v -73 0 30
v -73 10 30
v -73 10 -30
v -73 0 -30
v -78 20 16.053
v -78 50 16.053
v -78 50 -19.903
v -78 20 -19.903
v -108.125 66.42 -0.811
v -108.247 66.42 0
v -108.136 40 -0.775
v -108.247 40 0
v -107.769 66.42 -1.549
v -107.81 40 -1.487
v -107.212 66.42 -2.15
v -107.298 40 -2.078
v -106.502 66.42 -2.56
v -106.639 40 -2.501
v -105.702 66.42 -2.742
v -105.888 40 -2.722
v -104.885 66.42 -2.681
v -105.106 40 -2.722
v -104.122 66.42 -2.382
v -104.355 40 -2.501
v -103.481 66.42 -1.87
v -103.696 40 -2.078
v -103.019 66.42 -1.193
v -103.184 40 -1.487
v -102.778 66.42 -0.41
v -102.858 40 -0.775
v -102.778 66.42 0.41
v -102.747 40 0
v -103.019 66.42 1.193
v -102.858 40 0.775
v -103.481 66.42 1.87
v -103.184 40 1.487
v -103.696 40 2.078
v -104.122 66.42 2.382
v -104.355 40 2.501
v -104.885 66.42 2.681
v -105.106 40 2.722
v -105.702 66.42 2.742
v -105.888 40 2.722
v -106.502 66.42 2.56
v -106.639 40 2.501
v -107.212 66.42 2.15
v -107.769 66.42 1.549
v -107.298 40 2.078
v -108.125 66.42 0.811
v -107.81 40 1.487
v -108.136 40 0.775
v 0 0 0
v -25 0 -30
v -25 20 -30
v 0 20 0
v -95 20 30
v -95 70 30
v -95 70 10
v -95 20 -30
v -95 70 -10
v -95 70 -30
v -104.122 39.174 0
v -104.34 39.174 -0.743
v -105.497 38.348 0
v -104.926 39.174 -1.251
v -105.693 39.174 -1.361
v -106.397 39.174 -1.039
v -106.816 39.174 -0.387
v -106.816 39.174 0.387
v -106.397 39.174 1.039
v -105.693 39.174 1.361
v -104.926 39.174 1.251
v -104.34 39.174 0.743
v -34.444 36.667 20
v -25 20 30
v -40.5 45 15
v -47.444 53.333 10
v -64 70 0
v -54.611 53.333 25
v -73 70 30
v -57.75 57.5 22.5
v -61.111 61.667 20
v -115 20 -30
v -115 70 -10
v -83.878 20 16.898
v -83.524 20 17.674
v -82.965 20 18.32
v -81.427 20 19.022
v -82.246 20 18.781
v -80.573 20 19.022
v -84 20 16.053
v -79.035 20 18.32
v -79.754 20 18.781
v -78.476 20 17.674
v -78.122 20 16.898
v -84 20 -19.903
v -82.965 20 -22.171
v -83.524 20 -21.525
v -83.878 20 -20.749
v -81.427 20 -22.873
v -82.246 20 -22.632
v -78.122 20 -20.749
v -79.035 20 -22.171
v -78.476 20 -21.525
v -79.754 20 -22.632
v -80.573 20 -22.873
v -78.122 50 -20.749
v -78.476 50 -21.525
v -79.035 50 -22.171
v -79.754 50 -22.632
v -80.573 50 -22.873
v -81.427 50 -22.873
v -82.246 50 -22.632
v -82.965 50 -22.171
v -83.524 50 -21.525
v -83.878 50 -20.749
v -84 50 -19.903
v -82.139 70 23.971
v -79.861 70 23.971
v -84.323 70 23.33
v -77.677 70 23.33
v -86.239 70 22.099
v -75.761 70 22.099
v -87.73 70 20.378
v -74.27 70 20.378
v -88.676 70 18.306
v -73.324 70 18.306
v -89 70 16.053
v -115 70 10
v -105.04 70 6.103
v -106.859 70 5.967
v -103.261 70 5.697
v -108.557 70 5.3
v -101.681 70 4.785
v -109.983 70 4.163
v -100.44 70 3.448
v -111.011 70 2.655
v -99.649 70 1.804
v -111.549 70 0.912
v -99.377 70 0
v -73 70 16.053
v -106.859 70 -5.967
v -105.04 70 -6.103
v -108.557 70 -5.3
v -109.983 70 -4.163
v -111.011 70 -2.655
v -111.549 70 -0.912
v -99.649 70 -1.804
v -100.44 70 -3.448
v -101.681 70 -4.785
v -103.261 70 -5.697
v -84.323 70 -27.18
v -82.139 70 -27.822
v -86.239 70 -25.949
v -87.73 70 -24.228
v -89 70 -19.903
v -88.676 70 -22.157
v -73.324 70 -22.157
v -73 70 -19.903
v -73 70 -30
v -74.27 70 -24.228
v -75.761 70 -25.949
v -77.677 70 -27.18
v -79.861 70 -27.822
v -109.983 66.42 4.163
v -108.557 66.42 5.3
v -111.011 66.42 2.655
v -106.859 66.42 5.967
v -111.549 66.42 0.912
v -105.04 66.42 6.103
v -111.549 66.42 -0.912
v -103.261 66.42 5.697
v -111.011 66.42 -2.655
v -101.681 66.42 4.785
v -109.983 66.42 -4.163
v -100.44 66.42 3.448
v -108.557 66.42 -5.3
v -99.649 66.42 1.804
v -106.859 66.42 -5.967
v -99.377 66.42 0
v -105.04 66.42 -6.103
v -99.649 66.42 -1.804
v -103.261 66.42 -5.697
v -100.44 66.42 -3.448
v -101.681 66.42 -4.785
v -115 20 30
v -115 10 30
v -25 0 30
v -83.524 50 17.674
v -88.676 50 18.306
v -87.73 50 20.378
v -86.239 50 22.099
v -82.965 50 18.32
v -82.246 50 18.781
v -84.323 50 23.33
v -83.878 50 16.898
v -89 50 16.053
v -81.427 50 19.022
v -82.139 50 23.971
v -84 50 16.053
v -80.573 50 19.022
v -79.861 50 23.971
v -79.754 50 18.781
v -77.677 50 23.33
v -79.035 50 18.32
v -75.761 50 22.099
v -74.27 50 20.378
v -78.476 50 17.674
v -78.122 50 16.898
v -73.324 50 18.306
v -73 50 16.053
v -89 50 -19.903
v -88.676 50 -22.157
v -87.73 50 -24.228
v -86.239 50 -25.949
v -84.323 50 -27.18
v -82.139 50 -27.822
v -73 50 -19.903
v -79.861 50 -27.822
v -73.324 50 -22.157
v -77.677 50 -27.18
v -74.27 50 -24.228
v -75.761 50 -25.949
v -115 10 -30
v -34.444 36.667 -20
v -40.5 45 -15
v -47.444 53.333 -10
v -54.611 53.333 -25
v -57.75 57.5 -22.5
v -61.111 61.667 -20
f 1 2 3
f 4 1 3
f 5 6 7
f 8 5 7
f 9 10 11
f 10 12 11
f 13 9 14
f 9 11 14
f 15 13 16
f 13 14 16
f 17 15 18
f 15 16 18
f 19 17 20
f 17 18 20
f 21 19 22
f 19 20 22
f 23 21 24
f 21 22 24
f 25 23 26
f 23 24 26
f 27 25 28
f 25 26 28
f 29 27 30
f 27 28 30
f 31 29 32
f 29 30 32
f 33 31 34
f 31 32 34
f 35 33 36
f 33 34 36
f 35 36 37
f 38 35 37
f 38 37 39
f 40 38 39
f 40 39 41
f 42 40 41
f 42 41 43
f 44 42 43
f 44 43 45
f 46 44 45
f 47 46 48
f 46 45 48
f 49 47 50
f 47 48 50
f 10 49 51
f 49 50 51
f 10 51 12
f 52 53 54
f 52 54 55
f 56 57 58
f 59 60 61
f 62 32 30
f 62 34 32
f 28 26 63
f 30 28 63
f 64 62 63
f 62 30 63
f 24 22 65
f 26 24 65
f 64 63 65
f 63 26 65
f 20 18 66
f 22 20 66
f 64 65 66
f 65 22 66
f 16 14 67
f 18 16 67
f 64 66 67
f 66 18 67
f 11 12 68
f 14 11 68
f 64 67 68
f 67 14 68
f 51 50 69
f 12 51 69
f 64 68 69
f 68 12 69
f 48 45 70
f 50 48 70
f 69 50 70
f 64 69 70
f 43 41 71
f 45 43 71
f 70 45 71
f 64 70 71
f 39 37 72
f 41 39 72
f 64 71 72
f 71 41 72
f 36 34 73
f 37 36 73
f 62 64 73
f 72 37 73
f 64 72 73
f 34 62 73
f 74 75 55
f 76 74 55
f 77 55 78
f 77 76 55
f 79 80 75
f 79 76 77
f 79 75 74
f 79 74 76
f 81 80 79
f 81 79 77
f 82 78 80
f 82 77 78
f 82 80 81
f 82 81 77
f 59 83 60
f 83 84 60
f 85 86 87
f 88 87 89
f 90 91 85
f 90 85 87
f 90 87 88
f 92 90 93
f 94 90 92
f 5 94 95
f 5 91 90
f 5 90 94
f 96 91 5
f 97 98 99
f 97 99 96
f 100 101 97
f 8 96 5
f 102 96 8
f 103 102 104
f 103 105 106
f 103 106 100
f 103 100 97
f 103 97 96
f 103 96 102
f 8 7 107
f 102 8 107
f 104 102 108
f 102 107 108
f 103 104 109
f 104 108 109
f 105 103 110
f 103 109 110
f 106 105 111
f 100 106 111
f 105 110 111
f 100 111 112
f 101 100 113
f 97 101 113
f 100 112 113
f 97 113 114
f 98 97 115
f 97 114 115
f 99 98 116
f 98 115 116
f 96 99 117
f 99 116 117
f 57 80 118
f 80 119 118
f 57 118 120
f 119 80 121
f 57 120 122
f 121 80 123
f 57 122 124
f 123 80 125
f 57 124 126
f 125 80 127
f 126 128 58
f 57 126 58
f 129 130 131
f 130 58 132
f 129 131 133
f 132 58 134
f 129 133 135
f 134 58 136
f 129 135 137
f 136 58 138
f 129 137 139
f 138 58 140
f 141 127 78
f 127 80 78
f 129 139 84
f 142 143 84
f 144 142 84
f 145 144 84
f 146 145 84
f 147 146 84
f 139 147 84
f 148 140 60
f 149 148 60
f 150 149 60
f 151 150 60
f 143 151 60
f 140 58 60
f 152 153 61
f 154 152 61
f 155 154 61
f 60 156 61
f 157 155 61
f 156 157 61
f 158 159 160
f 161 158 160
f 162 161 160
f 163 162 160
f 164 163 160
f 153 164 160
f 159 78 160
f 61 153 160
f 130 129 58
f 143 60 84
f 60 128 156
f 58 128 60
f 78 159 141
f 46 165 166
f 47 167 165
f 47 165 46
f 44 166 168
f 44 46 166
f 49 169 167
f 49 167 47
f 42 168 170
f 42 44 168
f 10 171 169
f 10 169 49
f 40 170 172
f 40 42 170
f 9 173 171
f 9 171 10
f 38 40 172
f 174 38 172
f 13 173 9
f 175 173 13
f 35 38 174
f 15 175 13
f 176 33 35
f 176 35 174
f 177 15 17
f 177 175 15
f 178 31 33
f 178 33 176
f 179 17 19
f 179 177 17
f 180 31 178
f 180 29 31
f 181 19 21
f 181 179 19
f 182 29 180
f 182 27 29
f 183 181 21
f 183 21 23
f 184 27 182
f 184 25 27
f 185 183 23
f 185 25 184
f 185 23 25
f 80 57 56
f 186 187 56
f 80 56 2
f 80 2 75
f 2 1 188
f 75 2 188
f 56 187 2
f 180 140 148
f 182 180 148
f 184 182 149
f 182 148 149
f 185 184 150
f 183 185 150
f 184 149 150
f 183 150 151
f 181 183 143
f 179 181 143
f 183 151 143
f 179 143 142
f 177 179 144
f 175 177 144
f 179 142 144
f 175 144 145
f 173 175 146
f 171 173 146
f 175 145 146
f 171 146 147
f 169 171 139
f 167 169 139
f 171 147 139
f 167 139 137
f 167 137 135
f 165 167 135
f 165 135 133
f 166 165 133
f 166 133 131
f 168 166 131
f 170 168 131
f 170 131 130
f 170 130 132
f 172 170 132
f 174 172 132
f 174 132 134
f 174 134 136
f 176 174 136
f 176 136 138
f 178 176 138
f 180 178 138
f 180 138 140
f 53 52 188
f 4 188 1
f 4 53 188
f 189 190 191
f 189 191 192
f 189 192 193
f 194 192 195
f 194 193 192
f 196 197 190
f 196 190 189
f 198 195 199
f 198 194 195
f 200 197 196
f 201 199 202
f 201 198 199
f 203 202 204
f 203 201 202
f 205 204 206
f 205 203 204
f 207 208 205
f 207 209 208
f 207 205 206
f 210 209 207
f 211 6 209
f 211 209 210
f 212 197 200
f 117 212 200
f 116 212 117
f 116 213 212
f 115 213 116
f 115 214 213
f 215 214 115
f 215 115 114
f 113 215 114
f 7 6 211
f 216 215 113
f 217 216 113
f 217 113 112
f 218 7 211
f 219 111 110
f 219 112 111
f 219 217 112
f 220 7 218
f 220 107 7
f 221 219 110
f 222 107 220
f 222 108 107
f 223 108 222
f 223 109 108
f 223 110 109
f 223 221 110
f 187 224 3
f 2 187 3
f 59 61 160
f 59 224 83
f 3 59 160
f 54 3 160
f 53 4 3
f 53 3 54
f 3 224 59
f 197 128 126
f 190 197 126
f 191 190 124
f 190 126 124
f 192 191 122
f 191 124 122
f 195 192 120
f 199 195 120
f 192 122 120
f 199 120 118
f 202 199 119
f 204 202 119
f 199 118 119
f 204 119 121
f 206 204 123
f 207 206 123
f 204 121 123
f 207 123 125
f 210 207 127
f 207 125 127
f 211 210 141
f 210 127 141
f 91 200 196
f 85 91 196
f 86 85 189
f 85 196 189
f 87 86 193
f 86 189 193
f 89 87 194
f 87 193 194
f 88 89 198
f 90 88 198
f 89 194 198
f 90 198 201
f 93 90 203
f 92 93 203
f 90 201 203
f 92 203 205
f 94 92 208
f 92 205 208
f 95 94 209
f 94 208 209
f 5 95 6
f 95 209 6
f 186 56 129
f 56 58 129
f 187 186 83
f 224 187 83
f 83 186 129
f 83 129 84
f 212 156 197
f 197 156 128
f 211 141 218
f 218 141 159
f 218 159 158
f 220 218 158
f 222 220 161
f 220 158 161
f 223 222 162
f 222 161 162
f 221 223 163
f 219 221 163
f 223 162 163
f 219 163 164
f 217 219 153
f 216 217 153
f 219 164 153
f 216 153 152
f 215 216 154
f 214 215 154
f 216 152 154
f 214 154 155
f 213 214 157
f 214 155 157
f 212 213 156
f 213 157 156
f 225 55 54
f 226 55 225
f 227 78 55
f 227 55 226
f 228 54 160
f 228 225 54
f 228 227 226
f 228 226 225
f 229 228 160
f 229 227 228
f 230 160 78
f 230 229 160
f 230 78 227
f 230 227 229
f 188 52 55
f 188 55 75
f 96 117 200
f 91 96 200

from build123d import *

# Parameters (mm, degrees)
BOSS_EXTRUDE2_REACH                                  = 123.758
SKETCH4_119_W                                        = 22
SKETCH4_119_H                                        = 60
BOSS_EXTRUDE3_DEPTH                                  = 50
CUT_EXTRUDE1_DEPTH                                   = 20
CUT_EXTRUDE2_DEPTH                                   = 50
CUT_EXTRUDE3_START                                   = -10
SKETCH4_121_W                                        = 20
SKETCH4_121_H                                        = 60
SKETCH4_121_W_2                                      = 22
CUT_EXTRUDE3_DEPTH                                   = 10
CBORE_FOR_5_16_BINDING_HEAD_MACHINE_SCRE_D           = 5.499999922
CBORE_FOR_5_16_BINDING_HEAD_MACHINE_SCRE_DEPTH       = 30
CBORE_FOR_5_16_BINDING_HEAD_MACHINE_SCRE_CBORE_D     = 12.239999904
CBORE_FOR_5_16_BINDING_HEAD_MACHINE_SCRE_CBORE_DEPTH = 3.579999952
CBORE_FOR_5_16_BINDING_HEAD_MACHINE_SCRE_TIP         = 1.652366679


with BuildPart() as part:
    # Loft3: read off the stored shape, not the designer's step
    # Loft3: loft between two sections, ruled curve by curve
    loft3_from = [
        Edge.make_bspline([(-25, 20, 30), (0, 20, 0)], [0, 0, 1, 1], 1),
        Edge.make_bspline([(0, 20, 0), (-25, 20, -30)], [0, 0, 1, 1], 1),
        Edge.make_line((-73, 20, 30), (-25, 20, 30)),
        Edge.make_line((-25, 20, -30), (-73, 20, -30)),
        Edge.make_line((-73, 20, -30), (-73, 20, 30)),
    ]
    loft3_to = [
        Edge.make_bspline([(-73, 70, 30), (-64, 70, 0)], [0, 0, 1, 1], 1),
        Edge.make_bspline([(-64, 70, 0), (-73, 70, -30)], [0, 0, 1, 1], 1),
        Edge.make_line((-95, 70, 30), (-73, 70, 30)),
        Edge.make_line((-73, 70, -30), (-95, 70, -30)),
        Edge.make_line((-95, 70, -30), (-95, 70, 30)),
    ]
    loft3 = Solid(Shell([*[Face.make_surface_from_curves(loft3_from[k], loft3_to[k]) for k in range(5)], Face(Wire(loft3_from)), Face(Wire(loft3_to))]))
    add(loft3)

    # Boss-Extrude2: up to this face of the body (flat: up to its plane)
    boss_extrude2_end = Plane(part.part.faces().sort_by_distance((-42.319559229, 20, 0))[0])
    # Sketch1 → Boss-Extrude2 (add, up to the picked face)
    with BuildSketch(Plane(origin=(0, 0, 0), x_dir=(1, 0, 0), z_dir=(0, 1, 0)), mode=Mode.PRIVATE) as boss_extrude2_sk1:
        Polygon((-115, -30), (-115, 30), (-25, 30), (0, 0), (-25, -30), align=None)
    boss_extrude2_tool1 = split(extrude(boss_extrude2_sk1.sketch, amount=BOSS_EXTRUDE2_REACH, mode=Mode.PRIVATE), bisect_by=boss_extrude2_end, keep=Keep.BOTH, mode=Mode.PRIVATE)
    add(boss_extrude2_tool1.solids().sort_by(Axis((-63.495935, 0, 0), (0, 1, 0)))[0])

    # Sketch4 → Loft7 section 0
    with BuildSketch(Plane(origin=(0, 20, 0), x_dir=(1, 0, 0), z_dir=(0, 1, 0))):
        with BuildLine():
            Line((-73, -30), (-73, 30))
            Line((-73, 30), (-95, 30))
            Line((-95, 30), (-95, -30))
            Line((-95, -30), (-73, -30))
        make_face()
    # Sketch2<11> → Loft7 section 1
    with BuildSketch(Plane(origin=(0, 70, 0), x_dir=(1, 0, 0), z_dir=(0, 1, 0))):
        with BuildLine():
            Line((-115, 10), (-115, -10))
            Line((-115, -10), (-95, -10))
            Line((-95, -10), (-95, 10))
            Line((-95, 10), (-115, 10))
        make_face()
    loft()

    # Sketch2<14> → section 1 of loft9
    with BuildSketch(Plane(origin=(0, 70, 0), x_dir=(1, 0, 0), z_dir=(0, 1, 0)), mode=Mode.PRIVATE) as loft9_s1:
        with BuildLine():
            Line((-115, 10), (-115, -10))
            Line((-115, -10), (-95, -10))
            Line((-95, -10), (-95, 10))
            Line((-95, 10), (-115, 10))
        make_face()
    # loft from a face of the part (loft9)
    loft([part.faces().sort_by_distance((-105, 20, 0))[0], loft9_s1.sketch])

    # Sketch4<119> → Boss-Extrude3 (add)
    with BuildSketch(Plane(origin=(0, 20, 0), x_dir=(1, 0, 0), z_dir=(0, 1, 0))):
        with Locations((-84, 0)):
            Rectangle(SKETCH4_119_W, SKETCH4_119_H)
    extrude(amount=BOSS_EXTRUDE3_DEPTH)

    # Sketch2<8> → Cut-Extrude1 (cut)
    with BuildSketch(Plane(origin=(0, 70, 0), x_dir=(1, 0, 0), z_dir=(0, 1, 0))):
        with BuildLine():
            Line((-89, 19.903363007), (-89, -16.052534228))
            ThreePointArc((-89, -16.052534228), (-81, -24.052534228), (-73, -16.052534228))
            Line((-73, -16.052534228), (-73, 19.903363007))
            ThreePointArc((-73, 19.903363007), (-81, 27.903363007), (-89, 19.903363007))
        make_face()
        with BuildLine():
            ThreePointArc((-78, 19.903363007), (-81, 22.903363007), (-84, 19.903363007))
            Line((-84, 19.903363007), (-84, -16.052534228))
            ThreePointArc((-84, -16.052534228), (-81, -19.052534228), (-78, -16.052534228))
            Line((-78, -16.052534228), (-78, 19.903363007))
        make_face(mode=Mode.SUBTRACT)
    extrude(amount=-CUT_EXTRUDE1_DEPTH, mode=Mode.SUBTRACT)

    # Sketch2<13> → Cut-Extrude2 (cut)
    with BuildSketch(Plane(origin=(0, 70, 0), x_dir=(1, 0, 0), z_dir=(0, 1, 0))):
        with BuildLine():
            Line((-78, -16.052534228), (-78, 19.903363007))
            ThreePointArc((-78, 19.903363007), (-81, 22.903363007), (-84, 19.903363007))
            Line((-84, 19.903363007), (-84, -16.052534228))
            ThreePointArc((-84, -16.052534228), (-81, -19.052534228), (-78, -16.052534228))
        make_face()
    extrude(amount=-CUT_EXTRUDE2_DEPTH, mode=Mode.SUBTRACT)

    # Sketch4<121> → Cut-Extrude3 (cut)
    with BuildSketch(Plane(origin=(0, 20, 0), x_dir=(1, 0, 0), z_dir=(0, 1, 0)).offset(CUT_EXTRUDE3_START)):
        with Locations((-105, 0)):
            Rectangle(SKETCH4_121_W, SKETCH4_121_H)
        with Locations((-84, 0)):
            Rectangle(SKETCH4_121_W_2, SKETCH4_121_H)
    extrude(amount=-CUT_EXTRUDE3_DEPTH, mode=Mode.SUBTRACT)

    # CBORE for 5/16 Binding Head Machine Screw1
    with Locations(Plane(origin=(0, 70, 0), x_dir=(1, 0, 0), z_dir=(0, 1, 0))):
        with Locations((-105.496950166, 0)):
            CounterBoreHole(CBORE_FOR_5_16_BINDING_HEAD_MACHINE_SCRE_D / 2, CBORE_FOR_5_16_BINDING_HEAD_MACHINE_SCRE_CBORE_D / 2, CBORE_FOR_5_16_BINDING_HEAD_MACHINE_SCRE_CBORE_DEPTH, depth=CBORE_FOR_5_16_BINDING_HEAD_MACHINE_SCRE_DEPTH)
            with Locations((0, 0, -(CBORE_FOR_5_16_BINDING_HEAD_MACHINE_SCRE_DEPTH + CBORE_FOR_5_16_BINDING_HEAD_MACHINE_SCRE_TIP / 2))):  # 118° drill point
                Cone(0, CBORE_FOR_5_16_BINDING_HEAD_MACHINE_SCRE_D / 2, CBORE_FOR_5_16_BINDING_HEAD_MACHINE_SCRE_TIP, mode=Mode.SUBTRACT)


solid = part.part
